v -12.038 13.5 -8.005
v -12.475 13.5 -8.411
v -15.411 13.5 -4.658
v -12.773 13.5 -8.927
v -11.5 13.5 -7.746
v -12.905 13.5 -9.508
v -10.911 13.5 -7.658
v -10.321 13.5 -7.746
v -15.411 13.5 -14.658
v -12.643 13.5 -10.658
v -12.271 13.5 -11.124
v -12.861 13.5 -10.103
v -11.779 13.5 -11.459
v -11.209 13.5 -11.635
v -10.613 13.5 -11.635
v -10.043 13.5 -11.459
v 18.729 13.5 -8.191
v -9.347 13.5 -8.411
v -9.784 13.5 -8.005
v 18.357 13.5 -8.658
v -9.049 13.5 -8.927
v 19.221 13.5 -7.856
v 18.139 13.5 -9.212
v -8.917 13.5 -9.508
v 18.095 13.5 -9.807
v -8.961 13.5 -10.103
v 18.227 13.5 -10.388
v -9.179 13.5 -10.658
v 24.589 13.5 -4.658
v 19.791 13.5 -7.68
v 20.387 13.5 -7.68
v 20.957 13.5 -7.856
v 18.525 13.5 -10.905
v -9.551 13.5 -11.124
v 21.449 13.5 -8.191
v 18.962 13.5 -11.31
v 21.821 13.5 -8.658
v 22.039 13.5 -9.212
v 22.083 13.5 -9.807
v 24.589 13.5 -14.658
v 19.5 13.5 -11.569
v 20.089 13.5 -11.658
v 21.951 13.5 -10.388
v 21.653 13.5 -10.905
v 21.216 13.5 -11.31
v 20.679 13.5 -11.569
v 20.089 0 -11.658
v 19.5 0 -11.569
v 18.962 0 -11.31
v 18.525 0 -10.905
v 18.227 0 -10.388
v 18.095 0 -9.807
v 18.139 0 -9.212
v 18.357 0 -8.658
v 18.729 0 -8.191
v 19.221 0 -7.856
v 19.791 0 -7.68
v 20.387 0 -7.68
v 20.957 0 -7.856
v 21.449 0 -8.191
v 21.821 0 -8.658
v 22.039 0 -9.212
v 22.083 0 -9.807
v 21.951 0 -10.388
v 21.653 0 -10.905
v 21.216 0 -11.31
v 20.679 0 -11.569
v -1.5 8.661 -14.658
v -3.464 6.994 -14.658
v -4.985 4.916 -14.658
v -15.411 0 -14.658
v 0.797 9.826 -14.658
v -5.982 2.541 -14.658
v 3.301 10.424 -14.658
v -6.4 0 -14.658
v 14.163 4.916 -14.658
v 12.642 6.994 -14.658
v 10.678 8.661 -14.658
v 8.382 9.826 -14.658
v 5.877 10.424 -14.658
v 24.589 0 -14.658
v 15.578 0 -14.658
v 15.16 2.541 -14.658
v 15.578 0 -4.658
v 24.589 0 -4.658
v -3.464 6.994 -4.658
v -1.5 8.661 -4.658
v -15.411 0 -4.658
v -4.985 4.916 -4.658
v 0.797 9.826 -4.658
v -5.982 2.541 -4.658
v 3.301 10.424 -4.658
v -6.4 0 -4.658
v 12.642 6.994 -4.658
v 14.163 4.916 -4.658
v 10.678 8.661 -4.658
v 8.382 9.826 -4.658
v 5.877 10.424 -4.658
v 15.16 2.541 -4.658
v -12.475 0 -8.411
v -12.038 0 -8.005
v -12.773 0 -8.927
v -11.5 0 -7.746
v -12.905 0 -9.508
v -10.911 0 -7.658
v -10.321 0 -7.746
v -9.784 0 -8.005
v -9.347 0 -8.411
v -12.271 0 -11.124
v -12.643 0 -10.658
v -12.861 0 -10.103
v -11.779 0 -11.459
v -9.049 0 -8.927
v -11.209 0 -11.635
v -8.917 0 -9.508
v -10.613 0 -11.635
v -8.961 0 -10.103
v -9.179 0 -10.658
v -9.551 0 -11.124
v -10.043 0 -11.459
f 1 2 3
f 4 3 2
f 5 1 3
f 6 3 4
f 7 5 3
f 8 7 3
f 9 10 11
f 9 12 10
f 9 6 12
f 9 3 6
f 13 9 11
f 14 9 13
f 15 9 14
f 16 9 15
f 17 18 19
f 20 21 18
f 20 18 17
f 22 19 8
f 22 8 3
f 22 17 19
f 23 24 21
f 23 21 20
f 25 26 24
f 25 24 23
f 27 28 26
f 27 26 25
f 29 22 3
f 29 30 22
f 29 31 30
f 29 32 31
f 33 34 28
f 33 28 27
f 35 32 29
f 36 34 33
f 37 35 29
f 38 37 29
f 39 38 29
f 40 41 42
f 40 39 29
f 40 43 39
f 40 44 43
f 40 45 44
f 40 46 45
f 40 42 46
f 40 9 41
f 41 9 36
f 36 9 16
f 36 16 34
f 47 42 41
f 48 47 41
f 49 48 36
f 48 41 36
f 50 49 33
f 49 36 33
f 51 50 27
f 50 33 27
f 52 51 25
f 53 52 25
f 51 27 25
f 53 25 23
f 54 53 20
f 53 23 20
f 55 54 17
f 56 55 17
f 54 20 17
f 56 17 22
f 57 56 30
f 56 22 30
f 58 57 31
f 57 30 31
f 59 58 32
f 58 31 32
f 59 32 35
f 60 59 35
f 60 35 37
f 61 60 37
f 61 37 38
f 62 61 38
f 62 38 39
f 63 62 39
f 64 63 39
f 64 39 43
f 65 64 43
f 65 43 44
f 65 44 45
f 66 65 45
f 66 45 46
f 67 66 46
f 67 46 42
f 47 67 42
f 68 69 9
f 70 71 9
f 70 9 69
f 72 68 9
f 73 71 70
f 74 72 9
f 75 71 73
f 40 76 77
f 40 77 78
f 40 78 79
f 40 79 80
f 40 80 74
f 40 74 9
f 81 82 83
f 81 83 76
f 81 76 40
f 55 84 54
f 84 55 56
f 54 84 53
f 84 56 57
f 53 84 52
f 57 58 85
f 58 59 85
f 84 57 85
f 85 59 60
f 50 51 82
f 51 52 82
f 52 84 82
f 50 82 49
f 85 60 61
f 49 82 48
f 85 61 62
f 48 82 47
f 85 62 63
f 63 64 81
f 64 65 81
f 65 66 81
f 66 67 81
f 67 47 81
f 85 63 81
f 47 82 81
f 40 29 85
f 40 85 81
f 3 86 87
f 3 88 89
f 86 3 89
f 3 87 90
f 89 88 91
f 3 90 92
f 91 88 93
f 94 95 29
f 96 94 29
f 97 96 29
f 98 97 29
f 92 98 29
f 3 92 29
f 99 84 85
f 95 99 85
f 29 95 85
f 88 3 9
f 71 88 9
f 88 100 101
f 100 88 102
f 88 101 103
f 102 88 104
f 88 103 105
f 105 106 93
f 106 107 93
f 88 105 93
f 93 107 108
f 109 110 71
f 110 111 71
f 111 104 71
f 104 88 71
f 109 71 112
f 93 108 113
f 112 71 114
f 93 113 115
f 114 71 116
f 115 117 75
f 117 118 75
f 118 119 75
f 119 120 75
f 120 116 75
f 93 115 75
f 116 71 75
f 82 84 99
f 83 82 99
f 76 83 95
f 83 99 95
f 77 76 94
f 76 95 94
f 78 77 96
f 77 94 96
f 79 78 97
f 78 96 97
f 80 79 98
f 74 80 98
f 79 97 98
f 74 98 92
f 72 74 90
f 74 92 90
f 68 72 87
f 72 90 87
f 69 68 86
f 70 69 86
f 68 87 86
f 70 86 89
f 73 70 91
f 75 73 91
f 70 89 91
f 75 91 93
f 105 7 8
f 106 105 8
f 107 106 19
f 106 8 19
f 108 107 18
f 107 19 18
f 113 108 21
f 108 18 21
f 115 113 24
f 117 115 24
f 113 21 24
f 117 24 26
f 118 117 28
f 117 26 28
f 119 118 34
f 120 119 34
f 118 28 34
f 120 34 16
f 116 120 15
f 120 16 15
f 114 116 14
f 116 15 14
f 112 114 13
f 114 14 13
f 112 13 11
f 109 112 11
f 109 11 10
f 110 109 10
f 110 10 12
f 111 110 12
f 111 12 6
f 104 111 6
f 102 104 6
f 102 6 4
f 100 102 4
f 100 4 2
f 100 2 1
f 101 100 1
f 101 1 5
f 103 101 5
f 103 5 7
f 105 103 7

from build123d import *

# Parameters (mm, degrees)
ESQUISSE2_W             = 40
ESQUISSE2_H             = 10
BOSS_EXTRU_2_DEPTH      = 13.5
ENL_V_MAT_EXTRU_3_DEPTH = 30.780378473
ESQUISSE5_R             = 2
ENL_V_MAT_EXTRU_4_DEPTH = 32.649869703


with BuildPart() as part:
    # Esquisse2 → Boss.-Extru.2 (new body)
    with BuildSketch(Plane(origin=(0, 0, 0), x_dir=(1, 0, 0), z_dir=(0, 1, 0))):
        with Locations((4.589041096, 9.657534247)):
            Rectangle(ESQUISSE2_W, ESQUISSE2_H)
    extrude(amount=BOSS_EXTRU_2_DEPTH)

    # Esquisse4 → Enlèv. mat.-Extru.3 (cut, through all)
    with BuildSketch(Plane.XY.offset(-4.657534247)):
        with BuildLine():
            Line((-6.399589392, 0), (15.577671584, 0))
            ThreePointArc((15.577671584, 0), (4.589041096, 10.5), (-6.399589392, 0))
        make_face()
    extrude(amount=-ENL_V_MAT_EXTRU_3_DEPTH, mode=Mode.SUBTRACT)

    # Esquisse5 → Enlèv. mat.-Extru.4 (cut, through all)
    with BuildSketch(Plane(origin=(0, 13.5, 0), x_dir=(1, 0, 0), z_dir=(0, 1, 0))):
        with Locations(Location((-10.910958904, 9.657534247, 0), (0, 0, 270))):
            Circle(ESQUISSE5_R)
        with Locations(Location((20.089041096, 9.657534247, 0), (0, 0, 90))):
            Circle(ESQUISSE5_R)
    extrude(amount=-ENL_V_MAT_EXTRU_4_DEPTH, mode=Mode.SUBTRACT)


solid = part.part
